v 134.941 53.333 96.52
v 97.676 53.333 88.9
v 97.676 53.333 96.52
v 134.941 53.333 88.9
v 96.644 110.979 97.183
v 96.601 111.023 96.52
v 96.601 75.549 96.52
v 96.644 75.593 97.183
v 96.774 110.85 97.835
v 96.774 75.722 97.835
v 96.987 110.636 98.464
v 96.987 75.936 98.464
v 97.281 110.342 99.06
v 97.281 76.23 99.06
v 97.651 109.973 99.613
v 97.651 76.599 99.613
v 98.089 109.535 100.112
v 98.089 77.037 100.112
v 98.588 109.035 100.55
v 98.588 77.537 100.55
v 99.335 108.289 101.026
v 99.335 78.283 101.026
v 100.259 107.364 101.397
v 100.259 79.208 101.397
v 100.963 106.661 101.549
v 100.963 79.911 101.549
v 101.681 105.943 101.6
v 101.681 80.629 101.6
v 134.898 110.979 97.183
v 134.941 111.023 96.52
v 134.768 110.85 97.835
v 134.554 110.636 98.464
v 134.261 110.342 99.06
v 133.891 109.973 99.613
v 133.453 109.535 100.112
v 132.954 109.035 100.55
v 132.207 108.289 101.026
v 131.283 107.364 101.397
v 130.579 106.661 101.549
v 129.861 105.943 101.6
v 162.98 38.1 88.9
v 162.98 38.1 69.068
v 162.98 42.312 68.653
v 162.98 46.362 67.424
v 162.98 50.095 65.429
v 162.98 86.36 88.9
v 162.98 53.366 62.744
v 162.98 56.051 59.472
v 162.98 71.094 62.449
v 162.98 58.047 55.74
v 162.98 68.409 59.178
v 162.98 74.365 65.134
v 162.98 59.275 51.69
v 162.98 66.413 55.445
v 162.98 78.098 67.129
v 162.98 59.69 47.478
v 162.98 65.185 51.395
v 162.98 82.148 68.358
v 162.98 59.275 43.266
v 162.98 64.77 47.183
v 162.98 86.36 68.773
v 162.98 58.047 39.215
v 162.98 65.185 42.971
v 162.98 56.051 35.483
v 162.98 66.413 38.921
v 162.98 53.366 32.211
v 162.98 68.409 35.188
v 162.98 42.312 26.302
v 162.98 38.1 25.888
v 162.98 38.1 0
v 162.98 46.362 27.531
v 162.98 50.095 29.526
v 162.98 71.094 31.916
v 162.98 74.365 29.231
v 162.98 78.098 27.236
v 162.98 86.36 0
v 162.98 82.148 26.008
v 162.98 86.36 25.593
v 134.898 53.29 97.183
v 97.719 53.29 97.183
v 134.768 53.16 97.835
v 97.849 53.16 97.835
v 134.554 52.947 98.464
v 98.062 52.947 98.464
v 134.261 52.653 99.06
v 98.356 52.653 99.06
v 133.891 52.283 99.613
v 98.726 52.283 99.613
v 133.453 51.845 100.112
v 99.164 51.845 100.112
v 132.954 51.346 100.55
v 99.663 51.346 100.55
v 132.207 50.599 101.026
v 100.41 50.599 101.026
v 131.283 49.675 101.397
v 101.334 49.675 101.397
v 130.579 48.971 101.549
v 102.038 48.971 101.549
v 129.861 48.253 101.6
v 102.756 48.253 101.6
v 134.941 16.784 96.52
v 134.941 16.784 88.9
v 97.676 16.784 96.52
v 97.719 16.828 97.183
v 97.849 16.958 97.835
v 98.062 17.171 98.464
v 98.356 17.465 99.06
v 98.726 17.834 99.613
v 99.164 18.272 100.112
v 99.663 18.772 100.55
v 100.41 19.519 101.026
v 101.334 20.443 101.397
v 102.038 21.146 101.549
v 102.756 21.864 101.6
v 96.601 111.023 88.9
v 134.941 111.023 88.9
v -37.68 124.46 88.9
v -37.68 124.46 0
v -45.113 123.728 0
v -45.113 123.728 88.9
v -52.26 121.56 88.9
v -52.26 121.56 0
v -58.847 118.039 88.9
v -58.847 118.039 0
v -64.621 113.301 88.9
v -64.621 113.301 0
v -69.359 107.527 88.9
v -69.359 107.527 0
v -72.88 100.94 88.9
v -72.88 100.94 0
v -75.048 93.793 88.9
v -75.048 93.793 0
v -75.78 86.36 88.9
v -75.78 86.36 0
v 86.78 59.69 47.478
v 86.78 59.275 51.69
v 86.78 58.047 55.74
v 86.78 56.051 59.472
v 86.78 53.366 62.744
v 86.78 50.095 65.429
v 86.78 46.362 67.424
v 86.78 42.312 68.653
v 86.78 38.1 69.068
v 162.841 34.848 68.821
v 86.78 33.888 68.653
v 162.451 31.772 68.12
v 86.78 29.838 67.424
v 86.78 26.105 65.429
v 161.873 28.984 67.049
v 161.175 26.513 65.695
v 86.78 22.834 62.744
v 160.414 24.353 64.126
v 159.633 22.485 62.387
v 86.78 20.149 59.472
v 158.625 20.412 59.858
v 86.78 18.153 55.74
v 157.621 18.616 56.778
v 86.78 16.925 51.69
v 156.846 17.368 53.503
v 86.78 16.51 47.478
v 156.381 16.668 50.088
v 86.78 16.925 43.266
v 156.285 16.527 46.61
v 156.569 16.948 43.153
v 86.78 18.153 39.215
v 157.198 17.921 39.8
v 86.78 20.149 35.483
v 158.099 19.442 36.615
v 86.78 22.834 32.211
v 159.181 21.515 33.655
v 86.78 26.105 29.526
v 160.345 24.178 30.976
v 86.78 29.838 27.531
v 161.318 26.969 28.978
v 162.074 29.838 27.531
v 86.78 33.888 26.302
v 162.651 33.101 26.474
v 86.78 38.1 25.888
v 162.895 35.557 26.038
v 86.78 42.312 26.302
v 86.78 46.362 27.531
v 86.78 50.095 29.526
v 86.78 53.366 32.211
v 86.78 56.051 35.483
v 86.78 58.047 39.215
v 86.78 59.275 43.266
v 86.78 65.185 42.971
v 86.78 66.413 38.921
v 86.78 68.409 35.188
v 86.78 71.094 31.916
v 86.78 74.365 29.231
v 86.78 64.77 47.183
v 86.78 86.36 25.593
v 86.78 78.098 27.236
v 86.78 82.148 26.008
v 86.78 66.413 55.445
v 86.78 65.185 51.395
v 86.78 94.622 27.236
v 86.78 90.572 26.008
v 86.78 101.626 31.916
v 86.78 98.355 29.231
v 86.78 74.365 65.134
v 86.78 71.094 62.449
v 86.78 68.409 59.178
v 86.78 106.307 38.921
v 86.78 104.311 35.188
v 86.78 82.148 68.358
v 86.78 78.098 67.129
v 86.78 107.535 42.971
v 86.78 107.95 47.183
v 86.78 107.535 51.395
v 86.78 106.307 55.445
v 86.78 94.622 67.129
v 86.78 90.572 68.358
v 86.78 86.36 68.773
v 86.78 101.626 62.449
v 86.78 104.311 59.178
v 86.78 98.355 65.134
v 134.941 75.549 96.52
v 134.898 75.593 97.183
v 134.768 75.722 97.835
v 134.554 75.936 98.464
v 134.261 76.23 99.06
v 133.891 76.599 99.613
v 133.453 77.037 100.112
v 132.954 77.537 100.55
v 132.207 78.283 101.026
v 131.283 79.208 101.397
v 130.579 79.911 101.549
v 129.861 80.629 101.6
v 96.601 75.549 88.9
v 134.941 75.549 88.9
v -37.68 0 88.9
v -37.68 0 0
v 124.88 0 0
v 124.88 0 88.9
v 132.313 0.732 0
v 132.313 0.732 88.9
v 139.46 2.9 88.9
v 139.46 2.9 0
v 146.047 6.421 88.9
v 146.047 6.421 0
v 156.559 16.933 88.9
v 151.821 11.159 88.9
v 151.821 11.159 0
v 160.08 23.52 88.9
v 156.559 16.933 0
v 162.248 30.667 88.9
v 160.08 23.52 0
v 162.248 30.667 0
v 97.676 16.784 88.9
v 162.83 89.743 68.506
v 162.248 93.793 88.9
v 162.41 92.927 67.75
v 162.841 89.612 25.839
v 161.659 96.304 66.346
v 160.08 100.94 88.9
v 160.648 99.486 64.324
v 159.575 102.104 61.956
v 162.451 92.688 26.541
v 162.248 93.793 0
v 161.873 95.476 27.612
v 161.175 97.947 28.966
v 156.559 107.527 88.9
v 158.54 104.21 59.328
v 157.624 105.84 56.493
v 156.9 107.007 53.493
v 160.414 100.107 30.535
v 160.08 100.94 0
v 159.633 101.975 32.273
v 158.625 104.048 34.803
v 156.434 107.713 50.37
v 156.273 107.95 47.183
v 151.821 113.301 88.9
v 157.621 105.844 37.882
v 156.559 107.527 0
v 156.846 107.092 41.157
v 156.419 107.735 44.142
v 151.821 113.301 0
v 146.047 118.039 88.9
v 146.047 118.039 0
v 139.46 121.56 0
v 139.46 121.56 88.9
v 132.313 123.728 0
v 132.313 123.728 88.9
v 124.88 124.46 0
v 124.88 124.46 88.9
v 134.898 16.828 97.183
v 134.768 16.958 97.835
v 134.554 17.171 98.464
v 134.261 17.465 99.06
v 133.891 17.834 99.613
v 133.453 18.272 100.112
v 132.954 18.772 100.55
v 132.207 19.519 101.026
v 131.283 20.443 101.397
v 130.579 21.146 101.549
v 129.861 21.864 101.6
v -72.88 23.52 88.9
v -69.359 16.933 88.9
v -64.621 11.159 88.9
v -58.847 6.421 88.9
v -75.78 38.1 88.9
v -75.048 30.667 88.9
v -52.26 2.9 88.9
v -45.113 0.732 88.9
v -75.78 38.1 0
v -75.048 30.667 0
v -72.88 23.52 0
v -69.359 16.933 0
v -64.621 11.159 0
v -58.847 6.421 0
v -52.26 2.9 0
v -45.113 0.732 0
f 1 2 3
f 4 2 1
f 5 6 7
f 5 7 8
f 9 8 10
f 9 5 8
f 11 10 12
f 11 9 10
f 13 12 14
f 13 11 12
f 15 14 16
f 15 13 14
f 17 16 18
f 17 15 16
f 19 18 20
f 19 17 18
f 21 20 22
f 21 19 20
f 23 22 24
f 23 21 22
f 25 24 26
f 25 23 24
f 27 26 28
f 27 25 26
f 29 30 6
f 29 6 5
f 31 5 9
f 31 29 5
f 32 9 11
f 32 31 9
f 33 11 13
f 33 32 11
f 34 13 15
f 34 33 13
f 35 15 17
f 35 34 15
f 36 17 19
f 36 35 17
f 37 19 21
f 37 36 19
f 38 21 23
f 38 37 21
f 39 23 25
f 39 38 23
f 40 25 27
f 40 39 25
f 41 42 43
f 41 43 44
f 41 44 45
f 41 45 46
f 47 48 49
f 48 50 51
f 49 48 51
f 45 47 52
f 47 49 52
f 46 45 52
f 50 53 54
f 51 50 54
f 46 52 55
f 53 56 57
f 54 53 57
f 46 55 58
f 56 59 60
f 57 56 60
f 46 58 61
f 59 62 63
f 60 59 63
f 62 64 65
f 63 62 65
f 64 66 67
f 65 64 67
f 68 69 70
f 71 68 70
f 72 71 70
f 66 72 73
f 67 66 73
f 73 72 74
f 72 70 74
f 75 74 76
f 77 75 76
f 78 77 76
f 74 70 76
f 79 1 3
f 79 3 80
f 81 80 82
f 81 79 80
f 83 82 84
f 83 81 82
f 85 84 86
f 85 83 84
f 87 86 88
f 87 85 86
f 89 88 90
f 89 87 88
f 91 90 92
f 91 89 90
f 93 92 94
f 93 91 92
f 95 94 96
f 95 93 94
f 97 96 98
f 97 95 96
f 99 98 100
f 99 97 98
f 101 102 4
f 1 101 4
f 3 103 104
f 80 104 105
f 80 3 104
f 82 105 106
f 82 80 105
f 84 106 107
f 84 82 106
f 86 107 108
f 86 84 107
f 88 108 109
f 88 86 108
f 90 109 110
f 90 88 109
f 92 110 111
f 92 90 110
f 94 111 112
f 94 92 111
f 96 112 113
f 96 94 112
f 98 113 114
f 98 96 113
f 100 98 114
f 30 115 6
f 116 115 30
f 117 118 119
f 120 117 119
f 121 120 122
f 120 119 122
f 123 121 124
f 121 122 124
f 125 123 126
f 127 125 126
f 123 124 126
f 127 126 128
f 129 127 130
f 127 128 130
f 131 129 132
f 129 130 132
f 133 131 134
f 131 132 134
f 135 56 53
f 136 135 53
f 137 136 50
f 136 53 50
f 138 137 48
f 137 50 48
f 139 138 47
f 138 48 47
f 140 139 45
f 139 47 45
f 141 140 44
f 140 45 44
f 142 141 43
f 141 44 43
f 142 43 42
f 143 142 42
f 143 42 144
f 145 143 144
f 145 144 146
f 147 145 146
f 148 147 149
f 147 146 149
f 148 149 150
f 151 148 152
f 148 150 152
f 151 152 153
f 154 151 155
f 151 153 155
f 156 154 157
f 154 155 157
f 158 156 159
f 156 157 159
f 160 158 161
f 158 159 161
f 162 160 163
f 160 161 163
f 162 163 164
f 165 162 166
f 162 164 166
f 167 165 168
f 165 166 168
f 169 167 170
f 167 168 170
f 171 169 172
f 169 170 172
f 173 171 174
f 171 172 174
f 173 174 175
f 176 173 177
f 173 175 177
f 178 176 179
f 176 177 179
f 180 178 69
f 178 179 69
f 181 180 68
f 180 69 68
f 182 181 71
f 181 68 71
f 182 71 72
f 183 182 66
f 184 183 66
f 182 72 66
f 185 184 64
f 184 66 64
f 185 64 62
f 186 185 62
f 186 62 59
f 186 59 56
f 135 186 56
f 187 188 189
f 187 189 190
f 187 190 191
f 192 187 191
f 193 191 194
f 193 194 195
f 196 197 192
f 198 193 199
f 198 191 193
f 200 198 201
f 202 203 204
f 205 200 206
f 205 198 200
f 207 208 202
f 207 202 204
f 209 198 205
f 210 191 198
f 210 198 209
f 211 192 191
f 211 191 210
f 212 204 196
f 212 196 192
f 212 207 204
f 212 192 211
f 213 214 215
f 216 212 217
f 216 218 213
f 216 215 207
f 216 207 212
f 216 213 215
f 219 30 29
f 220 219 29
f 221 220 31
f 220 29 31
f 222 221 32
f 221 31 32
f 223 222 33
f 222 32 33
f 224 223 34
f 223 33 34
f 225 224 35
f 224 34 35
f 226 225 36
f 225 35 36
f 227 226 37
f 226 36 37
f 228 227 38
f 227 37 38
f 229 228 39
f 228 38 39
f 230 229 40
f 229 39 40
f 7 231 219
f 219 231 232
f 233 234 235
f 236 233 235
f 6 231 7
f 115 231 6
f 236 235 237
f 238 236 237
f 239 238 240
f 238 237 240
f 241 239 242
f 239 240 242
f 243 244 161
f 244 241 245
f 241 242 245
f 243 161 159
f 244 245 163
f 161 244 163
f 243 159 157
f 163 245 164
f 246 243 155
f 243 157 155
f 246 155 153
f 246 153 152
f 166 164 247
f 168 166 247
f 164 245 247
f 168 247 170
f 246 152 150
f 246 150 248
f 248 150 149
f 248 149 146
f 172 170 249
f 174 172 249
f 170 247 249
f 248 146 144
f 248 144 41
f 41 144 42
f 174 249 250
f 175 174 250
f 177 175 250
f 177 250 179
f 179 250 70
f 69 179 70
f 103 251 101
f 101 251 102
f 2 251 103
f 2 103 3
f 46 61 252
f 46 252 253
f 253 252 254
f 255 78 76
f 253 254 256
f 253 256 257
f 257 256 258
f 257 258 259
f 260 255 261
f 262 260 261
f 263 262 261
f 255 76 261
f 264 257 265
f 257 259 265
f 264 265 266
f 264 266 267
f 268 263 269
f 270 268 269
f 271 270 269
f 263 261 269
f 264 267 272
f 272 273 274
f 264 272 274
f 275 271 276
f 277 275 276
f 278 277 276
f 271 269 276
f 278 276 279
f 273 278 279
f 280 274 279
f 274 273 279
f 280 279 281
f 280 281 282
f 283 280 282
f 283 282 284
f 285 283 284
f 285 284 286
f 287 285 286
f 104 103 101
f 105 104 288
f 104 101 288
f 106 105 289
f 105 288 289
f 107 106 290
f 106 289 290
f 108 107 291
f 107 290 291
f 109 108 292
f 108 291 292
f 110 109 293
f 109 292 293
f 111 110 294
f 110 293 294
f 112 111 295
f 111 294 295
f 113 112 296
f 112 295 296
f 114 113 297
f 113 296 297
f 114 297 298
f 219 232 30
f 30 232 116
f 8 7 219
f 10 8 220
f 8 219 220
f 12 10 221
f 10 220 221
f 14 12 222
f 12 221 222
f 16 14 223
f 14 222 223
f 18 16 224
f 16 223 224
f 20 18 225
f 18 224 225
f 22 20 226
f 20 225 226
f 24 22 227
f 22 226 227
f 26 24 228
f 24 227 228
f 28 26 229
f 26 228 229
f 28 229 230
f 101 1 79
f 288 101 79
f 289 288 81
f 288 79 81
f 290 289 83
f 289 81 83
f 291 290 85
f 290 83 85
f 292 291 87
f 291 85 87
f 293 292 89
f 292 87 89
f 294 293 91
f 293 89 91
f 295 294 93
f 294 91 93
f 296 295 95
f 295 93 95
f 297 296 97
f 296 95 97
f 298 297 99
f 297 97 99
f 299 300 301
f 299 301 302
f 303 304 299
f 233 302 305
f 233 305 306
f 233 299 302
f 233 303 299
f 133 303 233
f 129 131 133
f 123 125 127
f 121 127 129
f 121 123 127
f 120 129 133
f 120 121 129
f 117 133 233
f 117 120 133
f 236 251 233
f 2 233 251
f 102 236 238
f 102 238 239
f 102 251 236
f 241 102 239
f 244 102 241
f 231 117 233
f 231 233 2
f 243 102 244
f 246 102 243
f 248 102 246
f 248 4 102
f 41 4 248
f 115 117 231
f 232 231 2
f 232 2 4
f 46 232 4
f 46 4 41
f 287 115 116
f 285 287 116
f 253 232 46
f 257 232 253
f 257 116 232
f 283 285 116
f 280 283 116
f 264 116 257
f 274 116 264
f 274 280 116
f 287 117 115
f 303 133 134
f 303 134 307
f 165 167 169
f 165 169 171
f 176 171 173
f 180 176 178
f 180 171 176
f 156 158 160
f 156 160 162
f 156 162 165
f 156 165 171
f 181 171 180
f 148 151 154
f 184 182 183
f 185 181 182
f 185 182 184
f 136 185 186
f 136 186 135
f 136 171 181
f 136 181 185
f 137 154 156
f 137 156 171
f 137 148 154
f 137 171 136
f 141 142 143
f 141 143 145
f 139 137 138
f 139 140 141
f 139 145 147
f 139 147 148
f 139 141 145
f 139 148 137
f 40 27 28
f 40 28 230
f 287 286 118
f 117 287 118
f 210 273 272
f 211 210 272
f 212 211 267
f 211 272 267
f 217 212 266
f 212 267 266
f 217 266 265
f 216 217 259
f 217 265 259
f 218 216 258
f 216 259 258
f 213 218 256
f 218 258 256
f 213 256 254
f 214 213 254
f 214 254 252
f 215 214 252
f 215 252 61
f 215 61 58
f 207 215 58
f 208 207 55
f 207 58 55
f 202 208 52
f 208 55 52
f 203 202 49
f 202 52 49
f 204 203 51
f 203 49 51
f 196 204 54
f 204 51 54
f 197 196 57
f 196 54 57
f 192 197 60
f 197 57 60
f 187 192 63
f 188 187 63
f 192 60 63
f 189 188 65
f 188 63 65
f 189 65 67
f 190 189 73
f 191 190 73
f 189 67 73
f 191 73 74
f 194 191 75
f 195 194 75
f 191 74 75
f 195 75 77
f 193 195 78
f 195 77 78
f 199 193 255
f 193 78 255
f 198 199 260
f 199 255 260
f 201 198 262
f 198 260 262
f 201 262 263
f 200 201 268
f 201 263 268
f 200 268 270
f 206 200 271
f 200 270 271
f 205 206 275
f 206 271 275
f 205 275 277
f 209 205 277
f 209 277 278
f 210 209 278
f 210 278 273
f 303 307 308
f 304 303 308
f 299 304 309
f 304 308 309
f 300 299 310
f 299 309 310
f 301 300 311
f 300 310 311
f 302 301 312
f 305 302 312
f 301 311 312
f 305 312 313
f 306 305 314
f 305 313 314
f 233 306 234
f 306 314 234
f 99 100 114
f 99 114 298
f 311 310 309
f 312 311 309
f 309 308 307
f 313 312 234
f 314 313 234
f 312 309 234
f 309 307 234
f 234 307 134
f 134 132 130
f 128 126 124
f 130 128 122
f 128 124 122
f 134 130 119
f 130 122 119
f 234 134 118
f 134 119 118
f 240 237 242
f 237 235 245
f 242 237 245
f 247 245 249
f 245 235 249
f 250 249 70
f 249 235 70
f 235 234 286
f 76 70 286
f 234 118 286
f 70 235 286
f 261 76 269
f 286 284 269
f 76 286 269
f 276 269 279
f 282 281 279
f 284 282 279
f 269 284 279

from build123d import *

# Parameters (mm, degrees)
F1_DEPTH = 88.9
F2_R     = 21.59
F3_DEPTH = 76.2
F4_W     = 38.340382
F4_H     = 35.473824
F4_W_2   = 37.265419
F4_H_2   = 36.548784
F5_DEPTH = 12.7
F6_R     = 5.08


with BuildPart() as f1:
    # F0 (on Top) → F1 (new body)
    with BuildSketch(Plane.XY):
        with BuildLine():
            ThreePointArc((-75.779863, 38.1), (-64.620631, 11.159232), (-37.679863, 0))
            Line((-37.679863, 0), (124.880137, 0))
            ThreePointArc((124.880137, 0), (151.820906, 11.159232), (162.980137, 38.1))
            Line((162.980137, 38.1), (162.980137, 86.36))
            ThreePointArc((162.980137, 86.36), (151.820906, 113.300768), (124.880137, 124.46))
            Line((124.880137, 124.46), (-37.679863, 124.46))
            ThreePointArc((-37.679863, 124.46), (-64.620631, 113.300768), (-75.779863, 86.36))
            Line((-75.779863, 86.36), (-75.779863, 38.1))
        make_face()
    extrude(amount=F1_DEPTH)

    # F2 (on face) → F3 (cut)
    with BuildSketch(Plane.YZ.offset(162.980137)):
        with Locations((38.1, 47.477592)):
            Circle(F2_R)
        with Locations((86.36, 47.182769)):
            Circle(F2_R)
    extrude(amount=-F3_DEPTH, mode=Mode.SUBTRACT)

    # F4 (on face) → F5 (join)
    with BuildSketch(Plane.XY.offset(88.9)):
        with Locations((115.770999, 93.28603)):
            Rectangle(F4_W, F4_H)
        with Locations((116.308481, 35.058801)):
            Rectangle(F4_W_2, F4_H_2)
    extrude(amount=F5_DEPTH)

    # F6
    f6_edges = [f1.edges().sort_by_distance(p)[0] for p in [
        (115.770999, 111.022942, 101.6),
        (96.600808, 93.28603, 101.6),
        (115.770999, 75.549118, 101.6),
        (134.94119, 93.28603, 101.6),
        (116.308481, 53.333193, 101.6),
        (97.675771, 35.058801, 101.6),
        (116.308481, 16.784409, 101.6),
        (134.94119, 35.058801, 101.6),
    ]]
    fillet(f6_edges, radius=F6_R)


solid = f1.part
